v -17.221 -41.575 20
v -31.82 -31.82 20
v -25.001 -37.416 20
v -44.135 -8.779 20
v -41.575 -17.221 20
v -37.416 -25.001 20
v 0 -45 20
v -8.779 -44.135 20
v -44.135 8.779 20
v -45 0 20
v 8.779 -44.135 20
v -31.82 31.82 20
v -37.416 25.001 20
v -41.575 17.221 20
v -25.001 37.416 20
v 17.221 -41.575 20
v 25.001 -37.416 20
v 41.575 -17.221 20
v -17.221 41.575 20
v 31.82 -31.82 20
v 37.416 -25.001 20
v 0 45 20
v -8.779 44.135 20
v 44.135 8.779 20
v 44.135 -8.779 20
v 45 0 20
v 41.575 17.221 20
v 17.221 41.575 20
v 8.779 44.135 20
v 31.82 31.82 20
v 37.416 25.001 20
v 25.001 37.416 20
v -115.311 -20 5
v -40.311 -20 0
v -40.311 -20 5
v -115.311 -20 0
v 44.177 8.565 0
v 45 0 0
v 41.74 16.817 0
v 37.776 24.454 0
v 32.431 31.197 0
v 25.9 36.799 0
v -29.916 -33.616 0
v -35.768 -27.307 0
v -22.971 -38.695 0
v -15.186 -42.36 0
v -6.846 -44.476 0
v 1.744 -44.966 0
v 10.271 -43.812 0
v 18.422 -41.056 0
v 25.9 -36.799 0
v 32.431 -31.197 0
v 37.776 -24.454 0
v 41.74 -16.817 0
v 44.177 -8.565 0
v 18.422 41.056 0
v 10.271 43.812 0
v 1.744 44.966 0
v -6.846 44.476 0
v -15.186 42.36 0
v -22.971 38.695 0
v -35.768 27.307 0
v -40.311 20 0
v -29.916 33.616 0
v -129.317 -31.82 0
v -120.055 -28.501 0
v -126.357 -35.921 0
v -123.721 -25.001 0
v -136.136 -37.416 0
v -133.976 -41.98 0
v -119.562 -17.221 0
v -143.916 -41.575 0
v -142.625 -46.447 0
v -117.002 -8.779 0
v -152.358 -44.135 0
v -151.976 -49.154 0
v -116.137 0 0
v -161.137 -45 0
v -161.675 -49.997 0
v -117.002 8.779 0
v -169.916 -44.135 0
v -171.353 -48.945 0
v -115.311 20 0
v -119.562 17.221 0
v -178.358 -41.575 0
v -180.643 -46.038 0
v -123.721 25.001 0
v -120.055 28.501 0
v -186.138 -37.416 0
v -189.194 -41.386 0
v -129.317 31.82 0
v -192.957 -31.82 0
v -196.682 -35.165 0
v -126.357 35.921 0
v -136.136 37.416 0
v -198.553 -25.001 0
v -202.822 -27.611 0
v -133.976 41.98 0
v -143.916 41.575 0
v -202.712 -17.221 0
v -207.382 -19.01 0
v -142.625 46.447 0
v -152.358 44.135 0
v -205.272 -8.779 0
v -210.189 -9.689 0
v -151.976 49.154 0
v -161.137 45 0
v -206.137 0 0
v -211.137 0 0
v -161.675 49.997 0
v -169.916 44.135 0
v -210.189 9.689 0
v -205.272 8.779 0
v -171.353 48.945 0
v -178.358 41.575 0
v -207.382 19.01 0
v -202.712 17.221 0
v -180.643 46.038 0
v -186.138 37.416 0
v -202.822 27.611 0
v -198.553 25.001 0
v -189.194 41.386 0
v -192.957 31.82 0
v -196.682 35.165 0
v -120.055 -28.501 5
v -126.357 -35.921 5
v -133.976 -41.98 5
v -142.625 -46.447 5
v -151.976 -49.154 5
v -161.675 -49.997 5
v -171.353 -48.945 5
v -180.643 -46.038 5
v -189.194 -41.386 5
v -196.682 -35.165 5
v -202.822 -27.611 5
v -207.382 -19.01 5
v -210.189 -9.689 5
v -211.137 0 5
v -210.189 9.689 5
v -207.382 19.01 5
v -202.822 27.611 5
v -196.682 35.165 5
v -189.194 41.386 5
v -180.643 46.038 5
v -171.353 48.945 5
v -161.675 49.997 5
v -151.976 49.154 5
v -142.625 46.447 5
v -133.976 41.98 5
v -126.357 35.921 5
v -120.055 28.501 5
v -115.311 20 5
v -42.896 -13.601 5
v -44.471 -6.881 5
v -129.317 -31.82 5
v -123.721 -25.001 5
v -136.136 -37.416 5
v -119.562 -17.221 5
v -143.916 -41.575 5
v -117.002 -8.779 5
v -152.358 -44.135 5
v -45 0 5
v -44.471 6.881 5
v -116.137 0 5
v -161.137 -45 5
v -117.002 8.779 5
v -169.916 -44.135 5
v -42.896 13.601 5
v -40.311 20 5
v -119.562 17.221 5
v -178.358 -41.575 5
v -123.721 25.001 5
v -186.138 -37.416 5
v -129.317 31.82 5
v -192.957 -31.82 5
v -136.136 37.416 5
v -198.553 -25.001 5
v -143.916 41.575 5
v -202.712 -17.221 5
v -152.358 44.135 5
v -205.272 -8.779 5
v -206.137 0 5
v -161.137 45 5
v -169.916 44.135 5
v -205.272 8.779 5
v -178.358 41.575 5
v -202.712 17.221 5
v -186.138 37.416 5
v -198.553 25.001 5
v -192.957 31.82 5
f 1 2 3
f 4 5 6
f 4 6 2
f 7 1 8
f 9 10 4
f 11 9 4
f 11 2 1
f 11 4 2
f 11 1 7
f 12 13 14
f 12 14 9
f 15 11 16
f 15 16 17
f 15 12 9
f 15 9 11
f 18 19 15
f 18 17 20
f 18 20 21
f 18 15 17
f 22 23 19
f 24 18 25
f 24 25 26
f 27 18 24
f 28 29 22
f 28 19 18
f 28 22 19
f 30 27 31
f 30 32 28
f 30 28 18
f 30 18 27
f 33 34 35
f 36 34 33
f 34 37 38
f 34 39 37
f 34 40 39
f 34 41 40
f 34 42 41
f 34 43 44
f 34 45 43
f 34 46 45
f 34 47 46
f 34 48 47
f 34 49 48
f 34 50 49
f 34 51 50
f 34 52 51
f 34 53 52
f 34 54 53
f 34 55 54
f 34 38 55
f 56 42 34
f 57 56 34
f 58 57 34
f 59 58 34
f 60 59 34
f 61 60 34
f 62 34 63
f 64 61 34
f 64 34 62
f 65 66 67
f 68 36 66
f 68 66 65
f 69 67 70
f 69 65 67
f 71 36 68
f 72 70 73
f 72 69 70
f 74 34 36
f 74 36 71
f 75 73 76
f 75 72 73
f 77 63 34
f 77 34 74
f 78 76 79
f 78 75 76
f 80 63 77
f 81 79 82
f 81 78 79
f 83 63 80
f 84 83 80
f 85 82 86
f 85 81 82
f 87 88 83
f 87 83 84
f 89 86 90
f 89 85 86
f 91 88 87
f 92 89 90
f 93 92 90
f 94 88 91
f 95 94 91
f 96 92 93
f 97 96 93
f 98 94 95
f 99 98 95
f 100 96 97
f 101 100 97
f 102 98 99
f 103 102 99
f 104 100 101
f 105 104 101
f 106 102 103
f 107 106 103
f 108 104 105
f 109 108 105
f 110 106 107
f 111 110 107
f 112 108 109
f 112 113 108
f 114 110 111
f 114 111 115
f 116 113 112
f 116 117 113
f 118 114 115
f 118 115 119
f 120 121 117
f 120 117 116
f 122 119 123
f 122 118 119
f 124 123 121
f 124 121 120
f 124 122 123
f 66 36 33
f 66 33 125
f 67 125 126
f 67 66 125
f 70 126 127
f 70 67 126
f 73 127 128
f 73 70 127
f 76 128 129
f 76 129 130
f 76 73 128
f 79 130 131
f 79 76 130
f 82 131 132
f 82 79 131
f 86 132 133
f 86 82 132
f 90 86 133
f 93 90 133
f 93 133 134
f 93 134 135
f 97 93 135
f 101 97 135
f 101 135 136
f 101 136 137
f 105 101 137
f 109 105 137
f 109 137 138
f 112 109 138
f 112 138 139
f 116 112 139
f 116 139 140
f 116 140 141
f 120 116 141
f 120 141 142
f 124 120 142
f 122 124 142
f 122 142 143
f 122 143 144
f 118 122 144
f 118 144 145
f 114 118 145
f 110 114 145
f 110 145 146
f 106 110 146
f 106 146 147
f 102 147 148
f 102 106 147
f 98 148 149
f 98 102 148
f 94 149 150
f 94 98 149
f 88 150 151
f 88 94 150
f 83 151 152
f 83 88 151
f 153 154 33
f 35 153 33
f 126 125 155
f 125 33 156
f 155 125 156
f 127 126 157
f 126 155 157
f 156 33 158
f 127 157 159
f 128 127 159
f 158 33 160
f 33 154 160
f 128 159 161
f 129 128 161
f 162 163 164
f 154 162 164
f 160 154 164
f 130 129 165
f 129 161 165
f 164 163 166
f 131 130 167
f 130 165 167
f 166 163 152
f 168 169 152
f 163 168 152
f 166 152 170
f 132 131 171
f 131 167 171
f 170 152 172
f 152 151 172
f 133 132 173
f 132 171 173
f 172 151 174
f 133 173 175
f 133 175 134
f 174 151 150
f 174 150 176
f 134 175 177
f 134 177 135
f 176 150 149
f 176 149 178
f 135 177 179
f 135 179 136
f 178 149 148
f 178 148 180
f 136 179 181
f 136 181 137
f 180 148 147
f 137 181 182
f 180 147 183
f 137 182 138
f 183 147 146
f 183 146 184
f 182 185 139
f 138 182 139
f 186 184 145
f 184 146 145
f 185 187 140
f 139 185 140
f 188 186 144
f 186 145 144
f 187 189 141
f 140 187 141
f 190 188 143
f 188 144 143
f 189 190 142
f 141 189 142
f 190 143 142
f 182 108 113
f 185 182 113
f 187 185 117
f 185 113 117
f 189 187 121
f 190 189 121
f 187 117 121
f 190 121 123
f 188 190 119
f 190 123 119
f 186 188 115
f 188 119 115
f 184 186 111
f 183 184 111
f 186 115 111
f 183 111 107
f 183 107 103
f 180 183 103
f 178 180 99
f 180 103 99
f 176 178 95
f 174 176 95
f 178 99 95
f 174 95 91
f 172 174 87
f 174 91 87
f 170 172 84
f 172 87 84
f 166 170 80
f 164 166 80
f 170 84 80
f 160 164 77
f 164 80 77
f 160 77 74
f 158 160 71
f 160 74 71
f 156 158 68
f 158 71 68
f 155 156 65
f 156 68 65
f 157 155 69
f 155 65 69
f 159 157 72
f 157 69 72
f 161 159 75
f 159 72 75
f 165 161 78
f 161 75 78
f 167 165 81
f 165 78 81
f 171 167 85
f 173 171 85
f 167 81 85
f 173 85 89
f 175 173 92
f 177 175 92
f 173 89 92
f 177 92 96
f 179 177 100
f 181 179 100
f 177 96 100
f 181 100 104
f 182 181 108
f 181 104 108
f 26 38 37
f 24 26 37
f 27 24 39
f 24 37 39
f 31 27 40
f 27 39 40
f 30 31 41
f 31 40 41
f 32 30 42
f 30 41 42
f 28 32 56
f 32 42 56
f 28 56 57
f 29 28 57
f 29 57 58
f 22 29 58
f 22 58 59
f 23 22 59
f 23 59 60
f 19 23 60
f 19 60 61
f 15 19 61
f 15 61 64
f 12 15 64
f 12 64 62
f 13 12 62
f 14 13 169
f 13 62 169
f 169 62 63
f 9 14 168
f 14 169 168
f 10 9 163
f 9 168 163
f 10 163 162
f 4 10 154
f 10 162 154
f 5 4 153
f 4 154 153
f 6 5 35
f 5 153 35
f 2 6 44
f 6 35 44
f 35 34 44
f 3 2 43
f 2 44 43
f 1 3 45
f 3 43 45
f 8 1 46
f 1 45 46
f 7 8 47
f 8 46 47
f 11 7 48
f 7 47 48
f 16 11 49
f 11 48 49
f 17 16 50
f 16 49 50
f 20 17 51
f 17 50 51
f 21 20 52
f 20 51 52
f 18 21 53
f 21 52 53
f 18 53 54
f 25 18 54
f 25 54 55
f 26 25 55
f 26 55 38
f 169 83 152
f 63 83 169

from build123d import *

# Parameters (mm, degrees)
SKETCH1_R           = 45
BOSS_EXTRUDE1_DEPTH = 20
SKETCH2_R           = 50
SKETCH2_R_2         = 45
BOSS_EXTRUDE2_DEPTH = 5


with BuildPart() as part:
    # Sketch1 → Boss-Extrude1 (new body)
    with BuildSketch(Plane.XY):
        Circle(SKETCH1_R)
    extrude(amount=BOSS_EXTRUDE1_DEPTH)

    # Sketch2 → Boss-Extrude2 (add)
    # profile 1 of 2: a face of its own
    with BuildSketch(Plane(origin=(0, 0, 0), x_dir=(-1, 0, 0), z_dir=(0, 0, -1))):
        with BuildLine():
            Line((115.311288741, 20), (40.311288741, 20))
            ThreePointArc((40.311288741, 20), (43.812144397, 10.271124735), (45, 0))
            ThreePointArc((45, 0), (43.812144397, -10.271124735), (40.311288741, -20))
            Line((40.311288741, -20), (115.311288741, -20))
            ThreePointArc((115.311288741, -20), (111.137045691, 0), (115.311288741, 20))
        make_face()
    # profile 2 of 2: a face of its own
    with BuildSketch(Plane(origin=(0, 0, 0), x_dir=(-1, 0, 0), z_dir=(0, 0, -1))):
        with Locations((161.137045691, 0)):
            Circle(SKETCH2_R)
        with Locations((161.137045691, 0)):
            Circle(SKETCH2_R_2, mode=Mode.SUBTRACT)
    extrude(amount=-BOSS_EXTRUDE2_DEPTH)


solid = part.part
